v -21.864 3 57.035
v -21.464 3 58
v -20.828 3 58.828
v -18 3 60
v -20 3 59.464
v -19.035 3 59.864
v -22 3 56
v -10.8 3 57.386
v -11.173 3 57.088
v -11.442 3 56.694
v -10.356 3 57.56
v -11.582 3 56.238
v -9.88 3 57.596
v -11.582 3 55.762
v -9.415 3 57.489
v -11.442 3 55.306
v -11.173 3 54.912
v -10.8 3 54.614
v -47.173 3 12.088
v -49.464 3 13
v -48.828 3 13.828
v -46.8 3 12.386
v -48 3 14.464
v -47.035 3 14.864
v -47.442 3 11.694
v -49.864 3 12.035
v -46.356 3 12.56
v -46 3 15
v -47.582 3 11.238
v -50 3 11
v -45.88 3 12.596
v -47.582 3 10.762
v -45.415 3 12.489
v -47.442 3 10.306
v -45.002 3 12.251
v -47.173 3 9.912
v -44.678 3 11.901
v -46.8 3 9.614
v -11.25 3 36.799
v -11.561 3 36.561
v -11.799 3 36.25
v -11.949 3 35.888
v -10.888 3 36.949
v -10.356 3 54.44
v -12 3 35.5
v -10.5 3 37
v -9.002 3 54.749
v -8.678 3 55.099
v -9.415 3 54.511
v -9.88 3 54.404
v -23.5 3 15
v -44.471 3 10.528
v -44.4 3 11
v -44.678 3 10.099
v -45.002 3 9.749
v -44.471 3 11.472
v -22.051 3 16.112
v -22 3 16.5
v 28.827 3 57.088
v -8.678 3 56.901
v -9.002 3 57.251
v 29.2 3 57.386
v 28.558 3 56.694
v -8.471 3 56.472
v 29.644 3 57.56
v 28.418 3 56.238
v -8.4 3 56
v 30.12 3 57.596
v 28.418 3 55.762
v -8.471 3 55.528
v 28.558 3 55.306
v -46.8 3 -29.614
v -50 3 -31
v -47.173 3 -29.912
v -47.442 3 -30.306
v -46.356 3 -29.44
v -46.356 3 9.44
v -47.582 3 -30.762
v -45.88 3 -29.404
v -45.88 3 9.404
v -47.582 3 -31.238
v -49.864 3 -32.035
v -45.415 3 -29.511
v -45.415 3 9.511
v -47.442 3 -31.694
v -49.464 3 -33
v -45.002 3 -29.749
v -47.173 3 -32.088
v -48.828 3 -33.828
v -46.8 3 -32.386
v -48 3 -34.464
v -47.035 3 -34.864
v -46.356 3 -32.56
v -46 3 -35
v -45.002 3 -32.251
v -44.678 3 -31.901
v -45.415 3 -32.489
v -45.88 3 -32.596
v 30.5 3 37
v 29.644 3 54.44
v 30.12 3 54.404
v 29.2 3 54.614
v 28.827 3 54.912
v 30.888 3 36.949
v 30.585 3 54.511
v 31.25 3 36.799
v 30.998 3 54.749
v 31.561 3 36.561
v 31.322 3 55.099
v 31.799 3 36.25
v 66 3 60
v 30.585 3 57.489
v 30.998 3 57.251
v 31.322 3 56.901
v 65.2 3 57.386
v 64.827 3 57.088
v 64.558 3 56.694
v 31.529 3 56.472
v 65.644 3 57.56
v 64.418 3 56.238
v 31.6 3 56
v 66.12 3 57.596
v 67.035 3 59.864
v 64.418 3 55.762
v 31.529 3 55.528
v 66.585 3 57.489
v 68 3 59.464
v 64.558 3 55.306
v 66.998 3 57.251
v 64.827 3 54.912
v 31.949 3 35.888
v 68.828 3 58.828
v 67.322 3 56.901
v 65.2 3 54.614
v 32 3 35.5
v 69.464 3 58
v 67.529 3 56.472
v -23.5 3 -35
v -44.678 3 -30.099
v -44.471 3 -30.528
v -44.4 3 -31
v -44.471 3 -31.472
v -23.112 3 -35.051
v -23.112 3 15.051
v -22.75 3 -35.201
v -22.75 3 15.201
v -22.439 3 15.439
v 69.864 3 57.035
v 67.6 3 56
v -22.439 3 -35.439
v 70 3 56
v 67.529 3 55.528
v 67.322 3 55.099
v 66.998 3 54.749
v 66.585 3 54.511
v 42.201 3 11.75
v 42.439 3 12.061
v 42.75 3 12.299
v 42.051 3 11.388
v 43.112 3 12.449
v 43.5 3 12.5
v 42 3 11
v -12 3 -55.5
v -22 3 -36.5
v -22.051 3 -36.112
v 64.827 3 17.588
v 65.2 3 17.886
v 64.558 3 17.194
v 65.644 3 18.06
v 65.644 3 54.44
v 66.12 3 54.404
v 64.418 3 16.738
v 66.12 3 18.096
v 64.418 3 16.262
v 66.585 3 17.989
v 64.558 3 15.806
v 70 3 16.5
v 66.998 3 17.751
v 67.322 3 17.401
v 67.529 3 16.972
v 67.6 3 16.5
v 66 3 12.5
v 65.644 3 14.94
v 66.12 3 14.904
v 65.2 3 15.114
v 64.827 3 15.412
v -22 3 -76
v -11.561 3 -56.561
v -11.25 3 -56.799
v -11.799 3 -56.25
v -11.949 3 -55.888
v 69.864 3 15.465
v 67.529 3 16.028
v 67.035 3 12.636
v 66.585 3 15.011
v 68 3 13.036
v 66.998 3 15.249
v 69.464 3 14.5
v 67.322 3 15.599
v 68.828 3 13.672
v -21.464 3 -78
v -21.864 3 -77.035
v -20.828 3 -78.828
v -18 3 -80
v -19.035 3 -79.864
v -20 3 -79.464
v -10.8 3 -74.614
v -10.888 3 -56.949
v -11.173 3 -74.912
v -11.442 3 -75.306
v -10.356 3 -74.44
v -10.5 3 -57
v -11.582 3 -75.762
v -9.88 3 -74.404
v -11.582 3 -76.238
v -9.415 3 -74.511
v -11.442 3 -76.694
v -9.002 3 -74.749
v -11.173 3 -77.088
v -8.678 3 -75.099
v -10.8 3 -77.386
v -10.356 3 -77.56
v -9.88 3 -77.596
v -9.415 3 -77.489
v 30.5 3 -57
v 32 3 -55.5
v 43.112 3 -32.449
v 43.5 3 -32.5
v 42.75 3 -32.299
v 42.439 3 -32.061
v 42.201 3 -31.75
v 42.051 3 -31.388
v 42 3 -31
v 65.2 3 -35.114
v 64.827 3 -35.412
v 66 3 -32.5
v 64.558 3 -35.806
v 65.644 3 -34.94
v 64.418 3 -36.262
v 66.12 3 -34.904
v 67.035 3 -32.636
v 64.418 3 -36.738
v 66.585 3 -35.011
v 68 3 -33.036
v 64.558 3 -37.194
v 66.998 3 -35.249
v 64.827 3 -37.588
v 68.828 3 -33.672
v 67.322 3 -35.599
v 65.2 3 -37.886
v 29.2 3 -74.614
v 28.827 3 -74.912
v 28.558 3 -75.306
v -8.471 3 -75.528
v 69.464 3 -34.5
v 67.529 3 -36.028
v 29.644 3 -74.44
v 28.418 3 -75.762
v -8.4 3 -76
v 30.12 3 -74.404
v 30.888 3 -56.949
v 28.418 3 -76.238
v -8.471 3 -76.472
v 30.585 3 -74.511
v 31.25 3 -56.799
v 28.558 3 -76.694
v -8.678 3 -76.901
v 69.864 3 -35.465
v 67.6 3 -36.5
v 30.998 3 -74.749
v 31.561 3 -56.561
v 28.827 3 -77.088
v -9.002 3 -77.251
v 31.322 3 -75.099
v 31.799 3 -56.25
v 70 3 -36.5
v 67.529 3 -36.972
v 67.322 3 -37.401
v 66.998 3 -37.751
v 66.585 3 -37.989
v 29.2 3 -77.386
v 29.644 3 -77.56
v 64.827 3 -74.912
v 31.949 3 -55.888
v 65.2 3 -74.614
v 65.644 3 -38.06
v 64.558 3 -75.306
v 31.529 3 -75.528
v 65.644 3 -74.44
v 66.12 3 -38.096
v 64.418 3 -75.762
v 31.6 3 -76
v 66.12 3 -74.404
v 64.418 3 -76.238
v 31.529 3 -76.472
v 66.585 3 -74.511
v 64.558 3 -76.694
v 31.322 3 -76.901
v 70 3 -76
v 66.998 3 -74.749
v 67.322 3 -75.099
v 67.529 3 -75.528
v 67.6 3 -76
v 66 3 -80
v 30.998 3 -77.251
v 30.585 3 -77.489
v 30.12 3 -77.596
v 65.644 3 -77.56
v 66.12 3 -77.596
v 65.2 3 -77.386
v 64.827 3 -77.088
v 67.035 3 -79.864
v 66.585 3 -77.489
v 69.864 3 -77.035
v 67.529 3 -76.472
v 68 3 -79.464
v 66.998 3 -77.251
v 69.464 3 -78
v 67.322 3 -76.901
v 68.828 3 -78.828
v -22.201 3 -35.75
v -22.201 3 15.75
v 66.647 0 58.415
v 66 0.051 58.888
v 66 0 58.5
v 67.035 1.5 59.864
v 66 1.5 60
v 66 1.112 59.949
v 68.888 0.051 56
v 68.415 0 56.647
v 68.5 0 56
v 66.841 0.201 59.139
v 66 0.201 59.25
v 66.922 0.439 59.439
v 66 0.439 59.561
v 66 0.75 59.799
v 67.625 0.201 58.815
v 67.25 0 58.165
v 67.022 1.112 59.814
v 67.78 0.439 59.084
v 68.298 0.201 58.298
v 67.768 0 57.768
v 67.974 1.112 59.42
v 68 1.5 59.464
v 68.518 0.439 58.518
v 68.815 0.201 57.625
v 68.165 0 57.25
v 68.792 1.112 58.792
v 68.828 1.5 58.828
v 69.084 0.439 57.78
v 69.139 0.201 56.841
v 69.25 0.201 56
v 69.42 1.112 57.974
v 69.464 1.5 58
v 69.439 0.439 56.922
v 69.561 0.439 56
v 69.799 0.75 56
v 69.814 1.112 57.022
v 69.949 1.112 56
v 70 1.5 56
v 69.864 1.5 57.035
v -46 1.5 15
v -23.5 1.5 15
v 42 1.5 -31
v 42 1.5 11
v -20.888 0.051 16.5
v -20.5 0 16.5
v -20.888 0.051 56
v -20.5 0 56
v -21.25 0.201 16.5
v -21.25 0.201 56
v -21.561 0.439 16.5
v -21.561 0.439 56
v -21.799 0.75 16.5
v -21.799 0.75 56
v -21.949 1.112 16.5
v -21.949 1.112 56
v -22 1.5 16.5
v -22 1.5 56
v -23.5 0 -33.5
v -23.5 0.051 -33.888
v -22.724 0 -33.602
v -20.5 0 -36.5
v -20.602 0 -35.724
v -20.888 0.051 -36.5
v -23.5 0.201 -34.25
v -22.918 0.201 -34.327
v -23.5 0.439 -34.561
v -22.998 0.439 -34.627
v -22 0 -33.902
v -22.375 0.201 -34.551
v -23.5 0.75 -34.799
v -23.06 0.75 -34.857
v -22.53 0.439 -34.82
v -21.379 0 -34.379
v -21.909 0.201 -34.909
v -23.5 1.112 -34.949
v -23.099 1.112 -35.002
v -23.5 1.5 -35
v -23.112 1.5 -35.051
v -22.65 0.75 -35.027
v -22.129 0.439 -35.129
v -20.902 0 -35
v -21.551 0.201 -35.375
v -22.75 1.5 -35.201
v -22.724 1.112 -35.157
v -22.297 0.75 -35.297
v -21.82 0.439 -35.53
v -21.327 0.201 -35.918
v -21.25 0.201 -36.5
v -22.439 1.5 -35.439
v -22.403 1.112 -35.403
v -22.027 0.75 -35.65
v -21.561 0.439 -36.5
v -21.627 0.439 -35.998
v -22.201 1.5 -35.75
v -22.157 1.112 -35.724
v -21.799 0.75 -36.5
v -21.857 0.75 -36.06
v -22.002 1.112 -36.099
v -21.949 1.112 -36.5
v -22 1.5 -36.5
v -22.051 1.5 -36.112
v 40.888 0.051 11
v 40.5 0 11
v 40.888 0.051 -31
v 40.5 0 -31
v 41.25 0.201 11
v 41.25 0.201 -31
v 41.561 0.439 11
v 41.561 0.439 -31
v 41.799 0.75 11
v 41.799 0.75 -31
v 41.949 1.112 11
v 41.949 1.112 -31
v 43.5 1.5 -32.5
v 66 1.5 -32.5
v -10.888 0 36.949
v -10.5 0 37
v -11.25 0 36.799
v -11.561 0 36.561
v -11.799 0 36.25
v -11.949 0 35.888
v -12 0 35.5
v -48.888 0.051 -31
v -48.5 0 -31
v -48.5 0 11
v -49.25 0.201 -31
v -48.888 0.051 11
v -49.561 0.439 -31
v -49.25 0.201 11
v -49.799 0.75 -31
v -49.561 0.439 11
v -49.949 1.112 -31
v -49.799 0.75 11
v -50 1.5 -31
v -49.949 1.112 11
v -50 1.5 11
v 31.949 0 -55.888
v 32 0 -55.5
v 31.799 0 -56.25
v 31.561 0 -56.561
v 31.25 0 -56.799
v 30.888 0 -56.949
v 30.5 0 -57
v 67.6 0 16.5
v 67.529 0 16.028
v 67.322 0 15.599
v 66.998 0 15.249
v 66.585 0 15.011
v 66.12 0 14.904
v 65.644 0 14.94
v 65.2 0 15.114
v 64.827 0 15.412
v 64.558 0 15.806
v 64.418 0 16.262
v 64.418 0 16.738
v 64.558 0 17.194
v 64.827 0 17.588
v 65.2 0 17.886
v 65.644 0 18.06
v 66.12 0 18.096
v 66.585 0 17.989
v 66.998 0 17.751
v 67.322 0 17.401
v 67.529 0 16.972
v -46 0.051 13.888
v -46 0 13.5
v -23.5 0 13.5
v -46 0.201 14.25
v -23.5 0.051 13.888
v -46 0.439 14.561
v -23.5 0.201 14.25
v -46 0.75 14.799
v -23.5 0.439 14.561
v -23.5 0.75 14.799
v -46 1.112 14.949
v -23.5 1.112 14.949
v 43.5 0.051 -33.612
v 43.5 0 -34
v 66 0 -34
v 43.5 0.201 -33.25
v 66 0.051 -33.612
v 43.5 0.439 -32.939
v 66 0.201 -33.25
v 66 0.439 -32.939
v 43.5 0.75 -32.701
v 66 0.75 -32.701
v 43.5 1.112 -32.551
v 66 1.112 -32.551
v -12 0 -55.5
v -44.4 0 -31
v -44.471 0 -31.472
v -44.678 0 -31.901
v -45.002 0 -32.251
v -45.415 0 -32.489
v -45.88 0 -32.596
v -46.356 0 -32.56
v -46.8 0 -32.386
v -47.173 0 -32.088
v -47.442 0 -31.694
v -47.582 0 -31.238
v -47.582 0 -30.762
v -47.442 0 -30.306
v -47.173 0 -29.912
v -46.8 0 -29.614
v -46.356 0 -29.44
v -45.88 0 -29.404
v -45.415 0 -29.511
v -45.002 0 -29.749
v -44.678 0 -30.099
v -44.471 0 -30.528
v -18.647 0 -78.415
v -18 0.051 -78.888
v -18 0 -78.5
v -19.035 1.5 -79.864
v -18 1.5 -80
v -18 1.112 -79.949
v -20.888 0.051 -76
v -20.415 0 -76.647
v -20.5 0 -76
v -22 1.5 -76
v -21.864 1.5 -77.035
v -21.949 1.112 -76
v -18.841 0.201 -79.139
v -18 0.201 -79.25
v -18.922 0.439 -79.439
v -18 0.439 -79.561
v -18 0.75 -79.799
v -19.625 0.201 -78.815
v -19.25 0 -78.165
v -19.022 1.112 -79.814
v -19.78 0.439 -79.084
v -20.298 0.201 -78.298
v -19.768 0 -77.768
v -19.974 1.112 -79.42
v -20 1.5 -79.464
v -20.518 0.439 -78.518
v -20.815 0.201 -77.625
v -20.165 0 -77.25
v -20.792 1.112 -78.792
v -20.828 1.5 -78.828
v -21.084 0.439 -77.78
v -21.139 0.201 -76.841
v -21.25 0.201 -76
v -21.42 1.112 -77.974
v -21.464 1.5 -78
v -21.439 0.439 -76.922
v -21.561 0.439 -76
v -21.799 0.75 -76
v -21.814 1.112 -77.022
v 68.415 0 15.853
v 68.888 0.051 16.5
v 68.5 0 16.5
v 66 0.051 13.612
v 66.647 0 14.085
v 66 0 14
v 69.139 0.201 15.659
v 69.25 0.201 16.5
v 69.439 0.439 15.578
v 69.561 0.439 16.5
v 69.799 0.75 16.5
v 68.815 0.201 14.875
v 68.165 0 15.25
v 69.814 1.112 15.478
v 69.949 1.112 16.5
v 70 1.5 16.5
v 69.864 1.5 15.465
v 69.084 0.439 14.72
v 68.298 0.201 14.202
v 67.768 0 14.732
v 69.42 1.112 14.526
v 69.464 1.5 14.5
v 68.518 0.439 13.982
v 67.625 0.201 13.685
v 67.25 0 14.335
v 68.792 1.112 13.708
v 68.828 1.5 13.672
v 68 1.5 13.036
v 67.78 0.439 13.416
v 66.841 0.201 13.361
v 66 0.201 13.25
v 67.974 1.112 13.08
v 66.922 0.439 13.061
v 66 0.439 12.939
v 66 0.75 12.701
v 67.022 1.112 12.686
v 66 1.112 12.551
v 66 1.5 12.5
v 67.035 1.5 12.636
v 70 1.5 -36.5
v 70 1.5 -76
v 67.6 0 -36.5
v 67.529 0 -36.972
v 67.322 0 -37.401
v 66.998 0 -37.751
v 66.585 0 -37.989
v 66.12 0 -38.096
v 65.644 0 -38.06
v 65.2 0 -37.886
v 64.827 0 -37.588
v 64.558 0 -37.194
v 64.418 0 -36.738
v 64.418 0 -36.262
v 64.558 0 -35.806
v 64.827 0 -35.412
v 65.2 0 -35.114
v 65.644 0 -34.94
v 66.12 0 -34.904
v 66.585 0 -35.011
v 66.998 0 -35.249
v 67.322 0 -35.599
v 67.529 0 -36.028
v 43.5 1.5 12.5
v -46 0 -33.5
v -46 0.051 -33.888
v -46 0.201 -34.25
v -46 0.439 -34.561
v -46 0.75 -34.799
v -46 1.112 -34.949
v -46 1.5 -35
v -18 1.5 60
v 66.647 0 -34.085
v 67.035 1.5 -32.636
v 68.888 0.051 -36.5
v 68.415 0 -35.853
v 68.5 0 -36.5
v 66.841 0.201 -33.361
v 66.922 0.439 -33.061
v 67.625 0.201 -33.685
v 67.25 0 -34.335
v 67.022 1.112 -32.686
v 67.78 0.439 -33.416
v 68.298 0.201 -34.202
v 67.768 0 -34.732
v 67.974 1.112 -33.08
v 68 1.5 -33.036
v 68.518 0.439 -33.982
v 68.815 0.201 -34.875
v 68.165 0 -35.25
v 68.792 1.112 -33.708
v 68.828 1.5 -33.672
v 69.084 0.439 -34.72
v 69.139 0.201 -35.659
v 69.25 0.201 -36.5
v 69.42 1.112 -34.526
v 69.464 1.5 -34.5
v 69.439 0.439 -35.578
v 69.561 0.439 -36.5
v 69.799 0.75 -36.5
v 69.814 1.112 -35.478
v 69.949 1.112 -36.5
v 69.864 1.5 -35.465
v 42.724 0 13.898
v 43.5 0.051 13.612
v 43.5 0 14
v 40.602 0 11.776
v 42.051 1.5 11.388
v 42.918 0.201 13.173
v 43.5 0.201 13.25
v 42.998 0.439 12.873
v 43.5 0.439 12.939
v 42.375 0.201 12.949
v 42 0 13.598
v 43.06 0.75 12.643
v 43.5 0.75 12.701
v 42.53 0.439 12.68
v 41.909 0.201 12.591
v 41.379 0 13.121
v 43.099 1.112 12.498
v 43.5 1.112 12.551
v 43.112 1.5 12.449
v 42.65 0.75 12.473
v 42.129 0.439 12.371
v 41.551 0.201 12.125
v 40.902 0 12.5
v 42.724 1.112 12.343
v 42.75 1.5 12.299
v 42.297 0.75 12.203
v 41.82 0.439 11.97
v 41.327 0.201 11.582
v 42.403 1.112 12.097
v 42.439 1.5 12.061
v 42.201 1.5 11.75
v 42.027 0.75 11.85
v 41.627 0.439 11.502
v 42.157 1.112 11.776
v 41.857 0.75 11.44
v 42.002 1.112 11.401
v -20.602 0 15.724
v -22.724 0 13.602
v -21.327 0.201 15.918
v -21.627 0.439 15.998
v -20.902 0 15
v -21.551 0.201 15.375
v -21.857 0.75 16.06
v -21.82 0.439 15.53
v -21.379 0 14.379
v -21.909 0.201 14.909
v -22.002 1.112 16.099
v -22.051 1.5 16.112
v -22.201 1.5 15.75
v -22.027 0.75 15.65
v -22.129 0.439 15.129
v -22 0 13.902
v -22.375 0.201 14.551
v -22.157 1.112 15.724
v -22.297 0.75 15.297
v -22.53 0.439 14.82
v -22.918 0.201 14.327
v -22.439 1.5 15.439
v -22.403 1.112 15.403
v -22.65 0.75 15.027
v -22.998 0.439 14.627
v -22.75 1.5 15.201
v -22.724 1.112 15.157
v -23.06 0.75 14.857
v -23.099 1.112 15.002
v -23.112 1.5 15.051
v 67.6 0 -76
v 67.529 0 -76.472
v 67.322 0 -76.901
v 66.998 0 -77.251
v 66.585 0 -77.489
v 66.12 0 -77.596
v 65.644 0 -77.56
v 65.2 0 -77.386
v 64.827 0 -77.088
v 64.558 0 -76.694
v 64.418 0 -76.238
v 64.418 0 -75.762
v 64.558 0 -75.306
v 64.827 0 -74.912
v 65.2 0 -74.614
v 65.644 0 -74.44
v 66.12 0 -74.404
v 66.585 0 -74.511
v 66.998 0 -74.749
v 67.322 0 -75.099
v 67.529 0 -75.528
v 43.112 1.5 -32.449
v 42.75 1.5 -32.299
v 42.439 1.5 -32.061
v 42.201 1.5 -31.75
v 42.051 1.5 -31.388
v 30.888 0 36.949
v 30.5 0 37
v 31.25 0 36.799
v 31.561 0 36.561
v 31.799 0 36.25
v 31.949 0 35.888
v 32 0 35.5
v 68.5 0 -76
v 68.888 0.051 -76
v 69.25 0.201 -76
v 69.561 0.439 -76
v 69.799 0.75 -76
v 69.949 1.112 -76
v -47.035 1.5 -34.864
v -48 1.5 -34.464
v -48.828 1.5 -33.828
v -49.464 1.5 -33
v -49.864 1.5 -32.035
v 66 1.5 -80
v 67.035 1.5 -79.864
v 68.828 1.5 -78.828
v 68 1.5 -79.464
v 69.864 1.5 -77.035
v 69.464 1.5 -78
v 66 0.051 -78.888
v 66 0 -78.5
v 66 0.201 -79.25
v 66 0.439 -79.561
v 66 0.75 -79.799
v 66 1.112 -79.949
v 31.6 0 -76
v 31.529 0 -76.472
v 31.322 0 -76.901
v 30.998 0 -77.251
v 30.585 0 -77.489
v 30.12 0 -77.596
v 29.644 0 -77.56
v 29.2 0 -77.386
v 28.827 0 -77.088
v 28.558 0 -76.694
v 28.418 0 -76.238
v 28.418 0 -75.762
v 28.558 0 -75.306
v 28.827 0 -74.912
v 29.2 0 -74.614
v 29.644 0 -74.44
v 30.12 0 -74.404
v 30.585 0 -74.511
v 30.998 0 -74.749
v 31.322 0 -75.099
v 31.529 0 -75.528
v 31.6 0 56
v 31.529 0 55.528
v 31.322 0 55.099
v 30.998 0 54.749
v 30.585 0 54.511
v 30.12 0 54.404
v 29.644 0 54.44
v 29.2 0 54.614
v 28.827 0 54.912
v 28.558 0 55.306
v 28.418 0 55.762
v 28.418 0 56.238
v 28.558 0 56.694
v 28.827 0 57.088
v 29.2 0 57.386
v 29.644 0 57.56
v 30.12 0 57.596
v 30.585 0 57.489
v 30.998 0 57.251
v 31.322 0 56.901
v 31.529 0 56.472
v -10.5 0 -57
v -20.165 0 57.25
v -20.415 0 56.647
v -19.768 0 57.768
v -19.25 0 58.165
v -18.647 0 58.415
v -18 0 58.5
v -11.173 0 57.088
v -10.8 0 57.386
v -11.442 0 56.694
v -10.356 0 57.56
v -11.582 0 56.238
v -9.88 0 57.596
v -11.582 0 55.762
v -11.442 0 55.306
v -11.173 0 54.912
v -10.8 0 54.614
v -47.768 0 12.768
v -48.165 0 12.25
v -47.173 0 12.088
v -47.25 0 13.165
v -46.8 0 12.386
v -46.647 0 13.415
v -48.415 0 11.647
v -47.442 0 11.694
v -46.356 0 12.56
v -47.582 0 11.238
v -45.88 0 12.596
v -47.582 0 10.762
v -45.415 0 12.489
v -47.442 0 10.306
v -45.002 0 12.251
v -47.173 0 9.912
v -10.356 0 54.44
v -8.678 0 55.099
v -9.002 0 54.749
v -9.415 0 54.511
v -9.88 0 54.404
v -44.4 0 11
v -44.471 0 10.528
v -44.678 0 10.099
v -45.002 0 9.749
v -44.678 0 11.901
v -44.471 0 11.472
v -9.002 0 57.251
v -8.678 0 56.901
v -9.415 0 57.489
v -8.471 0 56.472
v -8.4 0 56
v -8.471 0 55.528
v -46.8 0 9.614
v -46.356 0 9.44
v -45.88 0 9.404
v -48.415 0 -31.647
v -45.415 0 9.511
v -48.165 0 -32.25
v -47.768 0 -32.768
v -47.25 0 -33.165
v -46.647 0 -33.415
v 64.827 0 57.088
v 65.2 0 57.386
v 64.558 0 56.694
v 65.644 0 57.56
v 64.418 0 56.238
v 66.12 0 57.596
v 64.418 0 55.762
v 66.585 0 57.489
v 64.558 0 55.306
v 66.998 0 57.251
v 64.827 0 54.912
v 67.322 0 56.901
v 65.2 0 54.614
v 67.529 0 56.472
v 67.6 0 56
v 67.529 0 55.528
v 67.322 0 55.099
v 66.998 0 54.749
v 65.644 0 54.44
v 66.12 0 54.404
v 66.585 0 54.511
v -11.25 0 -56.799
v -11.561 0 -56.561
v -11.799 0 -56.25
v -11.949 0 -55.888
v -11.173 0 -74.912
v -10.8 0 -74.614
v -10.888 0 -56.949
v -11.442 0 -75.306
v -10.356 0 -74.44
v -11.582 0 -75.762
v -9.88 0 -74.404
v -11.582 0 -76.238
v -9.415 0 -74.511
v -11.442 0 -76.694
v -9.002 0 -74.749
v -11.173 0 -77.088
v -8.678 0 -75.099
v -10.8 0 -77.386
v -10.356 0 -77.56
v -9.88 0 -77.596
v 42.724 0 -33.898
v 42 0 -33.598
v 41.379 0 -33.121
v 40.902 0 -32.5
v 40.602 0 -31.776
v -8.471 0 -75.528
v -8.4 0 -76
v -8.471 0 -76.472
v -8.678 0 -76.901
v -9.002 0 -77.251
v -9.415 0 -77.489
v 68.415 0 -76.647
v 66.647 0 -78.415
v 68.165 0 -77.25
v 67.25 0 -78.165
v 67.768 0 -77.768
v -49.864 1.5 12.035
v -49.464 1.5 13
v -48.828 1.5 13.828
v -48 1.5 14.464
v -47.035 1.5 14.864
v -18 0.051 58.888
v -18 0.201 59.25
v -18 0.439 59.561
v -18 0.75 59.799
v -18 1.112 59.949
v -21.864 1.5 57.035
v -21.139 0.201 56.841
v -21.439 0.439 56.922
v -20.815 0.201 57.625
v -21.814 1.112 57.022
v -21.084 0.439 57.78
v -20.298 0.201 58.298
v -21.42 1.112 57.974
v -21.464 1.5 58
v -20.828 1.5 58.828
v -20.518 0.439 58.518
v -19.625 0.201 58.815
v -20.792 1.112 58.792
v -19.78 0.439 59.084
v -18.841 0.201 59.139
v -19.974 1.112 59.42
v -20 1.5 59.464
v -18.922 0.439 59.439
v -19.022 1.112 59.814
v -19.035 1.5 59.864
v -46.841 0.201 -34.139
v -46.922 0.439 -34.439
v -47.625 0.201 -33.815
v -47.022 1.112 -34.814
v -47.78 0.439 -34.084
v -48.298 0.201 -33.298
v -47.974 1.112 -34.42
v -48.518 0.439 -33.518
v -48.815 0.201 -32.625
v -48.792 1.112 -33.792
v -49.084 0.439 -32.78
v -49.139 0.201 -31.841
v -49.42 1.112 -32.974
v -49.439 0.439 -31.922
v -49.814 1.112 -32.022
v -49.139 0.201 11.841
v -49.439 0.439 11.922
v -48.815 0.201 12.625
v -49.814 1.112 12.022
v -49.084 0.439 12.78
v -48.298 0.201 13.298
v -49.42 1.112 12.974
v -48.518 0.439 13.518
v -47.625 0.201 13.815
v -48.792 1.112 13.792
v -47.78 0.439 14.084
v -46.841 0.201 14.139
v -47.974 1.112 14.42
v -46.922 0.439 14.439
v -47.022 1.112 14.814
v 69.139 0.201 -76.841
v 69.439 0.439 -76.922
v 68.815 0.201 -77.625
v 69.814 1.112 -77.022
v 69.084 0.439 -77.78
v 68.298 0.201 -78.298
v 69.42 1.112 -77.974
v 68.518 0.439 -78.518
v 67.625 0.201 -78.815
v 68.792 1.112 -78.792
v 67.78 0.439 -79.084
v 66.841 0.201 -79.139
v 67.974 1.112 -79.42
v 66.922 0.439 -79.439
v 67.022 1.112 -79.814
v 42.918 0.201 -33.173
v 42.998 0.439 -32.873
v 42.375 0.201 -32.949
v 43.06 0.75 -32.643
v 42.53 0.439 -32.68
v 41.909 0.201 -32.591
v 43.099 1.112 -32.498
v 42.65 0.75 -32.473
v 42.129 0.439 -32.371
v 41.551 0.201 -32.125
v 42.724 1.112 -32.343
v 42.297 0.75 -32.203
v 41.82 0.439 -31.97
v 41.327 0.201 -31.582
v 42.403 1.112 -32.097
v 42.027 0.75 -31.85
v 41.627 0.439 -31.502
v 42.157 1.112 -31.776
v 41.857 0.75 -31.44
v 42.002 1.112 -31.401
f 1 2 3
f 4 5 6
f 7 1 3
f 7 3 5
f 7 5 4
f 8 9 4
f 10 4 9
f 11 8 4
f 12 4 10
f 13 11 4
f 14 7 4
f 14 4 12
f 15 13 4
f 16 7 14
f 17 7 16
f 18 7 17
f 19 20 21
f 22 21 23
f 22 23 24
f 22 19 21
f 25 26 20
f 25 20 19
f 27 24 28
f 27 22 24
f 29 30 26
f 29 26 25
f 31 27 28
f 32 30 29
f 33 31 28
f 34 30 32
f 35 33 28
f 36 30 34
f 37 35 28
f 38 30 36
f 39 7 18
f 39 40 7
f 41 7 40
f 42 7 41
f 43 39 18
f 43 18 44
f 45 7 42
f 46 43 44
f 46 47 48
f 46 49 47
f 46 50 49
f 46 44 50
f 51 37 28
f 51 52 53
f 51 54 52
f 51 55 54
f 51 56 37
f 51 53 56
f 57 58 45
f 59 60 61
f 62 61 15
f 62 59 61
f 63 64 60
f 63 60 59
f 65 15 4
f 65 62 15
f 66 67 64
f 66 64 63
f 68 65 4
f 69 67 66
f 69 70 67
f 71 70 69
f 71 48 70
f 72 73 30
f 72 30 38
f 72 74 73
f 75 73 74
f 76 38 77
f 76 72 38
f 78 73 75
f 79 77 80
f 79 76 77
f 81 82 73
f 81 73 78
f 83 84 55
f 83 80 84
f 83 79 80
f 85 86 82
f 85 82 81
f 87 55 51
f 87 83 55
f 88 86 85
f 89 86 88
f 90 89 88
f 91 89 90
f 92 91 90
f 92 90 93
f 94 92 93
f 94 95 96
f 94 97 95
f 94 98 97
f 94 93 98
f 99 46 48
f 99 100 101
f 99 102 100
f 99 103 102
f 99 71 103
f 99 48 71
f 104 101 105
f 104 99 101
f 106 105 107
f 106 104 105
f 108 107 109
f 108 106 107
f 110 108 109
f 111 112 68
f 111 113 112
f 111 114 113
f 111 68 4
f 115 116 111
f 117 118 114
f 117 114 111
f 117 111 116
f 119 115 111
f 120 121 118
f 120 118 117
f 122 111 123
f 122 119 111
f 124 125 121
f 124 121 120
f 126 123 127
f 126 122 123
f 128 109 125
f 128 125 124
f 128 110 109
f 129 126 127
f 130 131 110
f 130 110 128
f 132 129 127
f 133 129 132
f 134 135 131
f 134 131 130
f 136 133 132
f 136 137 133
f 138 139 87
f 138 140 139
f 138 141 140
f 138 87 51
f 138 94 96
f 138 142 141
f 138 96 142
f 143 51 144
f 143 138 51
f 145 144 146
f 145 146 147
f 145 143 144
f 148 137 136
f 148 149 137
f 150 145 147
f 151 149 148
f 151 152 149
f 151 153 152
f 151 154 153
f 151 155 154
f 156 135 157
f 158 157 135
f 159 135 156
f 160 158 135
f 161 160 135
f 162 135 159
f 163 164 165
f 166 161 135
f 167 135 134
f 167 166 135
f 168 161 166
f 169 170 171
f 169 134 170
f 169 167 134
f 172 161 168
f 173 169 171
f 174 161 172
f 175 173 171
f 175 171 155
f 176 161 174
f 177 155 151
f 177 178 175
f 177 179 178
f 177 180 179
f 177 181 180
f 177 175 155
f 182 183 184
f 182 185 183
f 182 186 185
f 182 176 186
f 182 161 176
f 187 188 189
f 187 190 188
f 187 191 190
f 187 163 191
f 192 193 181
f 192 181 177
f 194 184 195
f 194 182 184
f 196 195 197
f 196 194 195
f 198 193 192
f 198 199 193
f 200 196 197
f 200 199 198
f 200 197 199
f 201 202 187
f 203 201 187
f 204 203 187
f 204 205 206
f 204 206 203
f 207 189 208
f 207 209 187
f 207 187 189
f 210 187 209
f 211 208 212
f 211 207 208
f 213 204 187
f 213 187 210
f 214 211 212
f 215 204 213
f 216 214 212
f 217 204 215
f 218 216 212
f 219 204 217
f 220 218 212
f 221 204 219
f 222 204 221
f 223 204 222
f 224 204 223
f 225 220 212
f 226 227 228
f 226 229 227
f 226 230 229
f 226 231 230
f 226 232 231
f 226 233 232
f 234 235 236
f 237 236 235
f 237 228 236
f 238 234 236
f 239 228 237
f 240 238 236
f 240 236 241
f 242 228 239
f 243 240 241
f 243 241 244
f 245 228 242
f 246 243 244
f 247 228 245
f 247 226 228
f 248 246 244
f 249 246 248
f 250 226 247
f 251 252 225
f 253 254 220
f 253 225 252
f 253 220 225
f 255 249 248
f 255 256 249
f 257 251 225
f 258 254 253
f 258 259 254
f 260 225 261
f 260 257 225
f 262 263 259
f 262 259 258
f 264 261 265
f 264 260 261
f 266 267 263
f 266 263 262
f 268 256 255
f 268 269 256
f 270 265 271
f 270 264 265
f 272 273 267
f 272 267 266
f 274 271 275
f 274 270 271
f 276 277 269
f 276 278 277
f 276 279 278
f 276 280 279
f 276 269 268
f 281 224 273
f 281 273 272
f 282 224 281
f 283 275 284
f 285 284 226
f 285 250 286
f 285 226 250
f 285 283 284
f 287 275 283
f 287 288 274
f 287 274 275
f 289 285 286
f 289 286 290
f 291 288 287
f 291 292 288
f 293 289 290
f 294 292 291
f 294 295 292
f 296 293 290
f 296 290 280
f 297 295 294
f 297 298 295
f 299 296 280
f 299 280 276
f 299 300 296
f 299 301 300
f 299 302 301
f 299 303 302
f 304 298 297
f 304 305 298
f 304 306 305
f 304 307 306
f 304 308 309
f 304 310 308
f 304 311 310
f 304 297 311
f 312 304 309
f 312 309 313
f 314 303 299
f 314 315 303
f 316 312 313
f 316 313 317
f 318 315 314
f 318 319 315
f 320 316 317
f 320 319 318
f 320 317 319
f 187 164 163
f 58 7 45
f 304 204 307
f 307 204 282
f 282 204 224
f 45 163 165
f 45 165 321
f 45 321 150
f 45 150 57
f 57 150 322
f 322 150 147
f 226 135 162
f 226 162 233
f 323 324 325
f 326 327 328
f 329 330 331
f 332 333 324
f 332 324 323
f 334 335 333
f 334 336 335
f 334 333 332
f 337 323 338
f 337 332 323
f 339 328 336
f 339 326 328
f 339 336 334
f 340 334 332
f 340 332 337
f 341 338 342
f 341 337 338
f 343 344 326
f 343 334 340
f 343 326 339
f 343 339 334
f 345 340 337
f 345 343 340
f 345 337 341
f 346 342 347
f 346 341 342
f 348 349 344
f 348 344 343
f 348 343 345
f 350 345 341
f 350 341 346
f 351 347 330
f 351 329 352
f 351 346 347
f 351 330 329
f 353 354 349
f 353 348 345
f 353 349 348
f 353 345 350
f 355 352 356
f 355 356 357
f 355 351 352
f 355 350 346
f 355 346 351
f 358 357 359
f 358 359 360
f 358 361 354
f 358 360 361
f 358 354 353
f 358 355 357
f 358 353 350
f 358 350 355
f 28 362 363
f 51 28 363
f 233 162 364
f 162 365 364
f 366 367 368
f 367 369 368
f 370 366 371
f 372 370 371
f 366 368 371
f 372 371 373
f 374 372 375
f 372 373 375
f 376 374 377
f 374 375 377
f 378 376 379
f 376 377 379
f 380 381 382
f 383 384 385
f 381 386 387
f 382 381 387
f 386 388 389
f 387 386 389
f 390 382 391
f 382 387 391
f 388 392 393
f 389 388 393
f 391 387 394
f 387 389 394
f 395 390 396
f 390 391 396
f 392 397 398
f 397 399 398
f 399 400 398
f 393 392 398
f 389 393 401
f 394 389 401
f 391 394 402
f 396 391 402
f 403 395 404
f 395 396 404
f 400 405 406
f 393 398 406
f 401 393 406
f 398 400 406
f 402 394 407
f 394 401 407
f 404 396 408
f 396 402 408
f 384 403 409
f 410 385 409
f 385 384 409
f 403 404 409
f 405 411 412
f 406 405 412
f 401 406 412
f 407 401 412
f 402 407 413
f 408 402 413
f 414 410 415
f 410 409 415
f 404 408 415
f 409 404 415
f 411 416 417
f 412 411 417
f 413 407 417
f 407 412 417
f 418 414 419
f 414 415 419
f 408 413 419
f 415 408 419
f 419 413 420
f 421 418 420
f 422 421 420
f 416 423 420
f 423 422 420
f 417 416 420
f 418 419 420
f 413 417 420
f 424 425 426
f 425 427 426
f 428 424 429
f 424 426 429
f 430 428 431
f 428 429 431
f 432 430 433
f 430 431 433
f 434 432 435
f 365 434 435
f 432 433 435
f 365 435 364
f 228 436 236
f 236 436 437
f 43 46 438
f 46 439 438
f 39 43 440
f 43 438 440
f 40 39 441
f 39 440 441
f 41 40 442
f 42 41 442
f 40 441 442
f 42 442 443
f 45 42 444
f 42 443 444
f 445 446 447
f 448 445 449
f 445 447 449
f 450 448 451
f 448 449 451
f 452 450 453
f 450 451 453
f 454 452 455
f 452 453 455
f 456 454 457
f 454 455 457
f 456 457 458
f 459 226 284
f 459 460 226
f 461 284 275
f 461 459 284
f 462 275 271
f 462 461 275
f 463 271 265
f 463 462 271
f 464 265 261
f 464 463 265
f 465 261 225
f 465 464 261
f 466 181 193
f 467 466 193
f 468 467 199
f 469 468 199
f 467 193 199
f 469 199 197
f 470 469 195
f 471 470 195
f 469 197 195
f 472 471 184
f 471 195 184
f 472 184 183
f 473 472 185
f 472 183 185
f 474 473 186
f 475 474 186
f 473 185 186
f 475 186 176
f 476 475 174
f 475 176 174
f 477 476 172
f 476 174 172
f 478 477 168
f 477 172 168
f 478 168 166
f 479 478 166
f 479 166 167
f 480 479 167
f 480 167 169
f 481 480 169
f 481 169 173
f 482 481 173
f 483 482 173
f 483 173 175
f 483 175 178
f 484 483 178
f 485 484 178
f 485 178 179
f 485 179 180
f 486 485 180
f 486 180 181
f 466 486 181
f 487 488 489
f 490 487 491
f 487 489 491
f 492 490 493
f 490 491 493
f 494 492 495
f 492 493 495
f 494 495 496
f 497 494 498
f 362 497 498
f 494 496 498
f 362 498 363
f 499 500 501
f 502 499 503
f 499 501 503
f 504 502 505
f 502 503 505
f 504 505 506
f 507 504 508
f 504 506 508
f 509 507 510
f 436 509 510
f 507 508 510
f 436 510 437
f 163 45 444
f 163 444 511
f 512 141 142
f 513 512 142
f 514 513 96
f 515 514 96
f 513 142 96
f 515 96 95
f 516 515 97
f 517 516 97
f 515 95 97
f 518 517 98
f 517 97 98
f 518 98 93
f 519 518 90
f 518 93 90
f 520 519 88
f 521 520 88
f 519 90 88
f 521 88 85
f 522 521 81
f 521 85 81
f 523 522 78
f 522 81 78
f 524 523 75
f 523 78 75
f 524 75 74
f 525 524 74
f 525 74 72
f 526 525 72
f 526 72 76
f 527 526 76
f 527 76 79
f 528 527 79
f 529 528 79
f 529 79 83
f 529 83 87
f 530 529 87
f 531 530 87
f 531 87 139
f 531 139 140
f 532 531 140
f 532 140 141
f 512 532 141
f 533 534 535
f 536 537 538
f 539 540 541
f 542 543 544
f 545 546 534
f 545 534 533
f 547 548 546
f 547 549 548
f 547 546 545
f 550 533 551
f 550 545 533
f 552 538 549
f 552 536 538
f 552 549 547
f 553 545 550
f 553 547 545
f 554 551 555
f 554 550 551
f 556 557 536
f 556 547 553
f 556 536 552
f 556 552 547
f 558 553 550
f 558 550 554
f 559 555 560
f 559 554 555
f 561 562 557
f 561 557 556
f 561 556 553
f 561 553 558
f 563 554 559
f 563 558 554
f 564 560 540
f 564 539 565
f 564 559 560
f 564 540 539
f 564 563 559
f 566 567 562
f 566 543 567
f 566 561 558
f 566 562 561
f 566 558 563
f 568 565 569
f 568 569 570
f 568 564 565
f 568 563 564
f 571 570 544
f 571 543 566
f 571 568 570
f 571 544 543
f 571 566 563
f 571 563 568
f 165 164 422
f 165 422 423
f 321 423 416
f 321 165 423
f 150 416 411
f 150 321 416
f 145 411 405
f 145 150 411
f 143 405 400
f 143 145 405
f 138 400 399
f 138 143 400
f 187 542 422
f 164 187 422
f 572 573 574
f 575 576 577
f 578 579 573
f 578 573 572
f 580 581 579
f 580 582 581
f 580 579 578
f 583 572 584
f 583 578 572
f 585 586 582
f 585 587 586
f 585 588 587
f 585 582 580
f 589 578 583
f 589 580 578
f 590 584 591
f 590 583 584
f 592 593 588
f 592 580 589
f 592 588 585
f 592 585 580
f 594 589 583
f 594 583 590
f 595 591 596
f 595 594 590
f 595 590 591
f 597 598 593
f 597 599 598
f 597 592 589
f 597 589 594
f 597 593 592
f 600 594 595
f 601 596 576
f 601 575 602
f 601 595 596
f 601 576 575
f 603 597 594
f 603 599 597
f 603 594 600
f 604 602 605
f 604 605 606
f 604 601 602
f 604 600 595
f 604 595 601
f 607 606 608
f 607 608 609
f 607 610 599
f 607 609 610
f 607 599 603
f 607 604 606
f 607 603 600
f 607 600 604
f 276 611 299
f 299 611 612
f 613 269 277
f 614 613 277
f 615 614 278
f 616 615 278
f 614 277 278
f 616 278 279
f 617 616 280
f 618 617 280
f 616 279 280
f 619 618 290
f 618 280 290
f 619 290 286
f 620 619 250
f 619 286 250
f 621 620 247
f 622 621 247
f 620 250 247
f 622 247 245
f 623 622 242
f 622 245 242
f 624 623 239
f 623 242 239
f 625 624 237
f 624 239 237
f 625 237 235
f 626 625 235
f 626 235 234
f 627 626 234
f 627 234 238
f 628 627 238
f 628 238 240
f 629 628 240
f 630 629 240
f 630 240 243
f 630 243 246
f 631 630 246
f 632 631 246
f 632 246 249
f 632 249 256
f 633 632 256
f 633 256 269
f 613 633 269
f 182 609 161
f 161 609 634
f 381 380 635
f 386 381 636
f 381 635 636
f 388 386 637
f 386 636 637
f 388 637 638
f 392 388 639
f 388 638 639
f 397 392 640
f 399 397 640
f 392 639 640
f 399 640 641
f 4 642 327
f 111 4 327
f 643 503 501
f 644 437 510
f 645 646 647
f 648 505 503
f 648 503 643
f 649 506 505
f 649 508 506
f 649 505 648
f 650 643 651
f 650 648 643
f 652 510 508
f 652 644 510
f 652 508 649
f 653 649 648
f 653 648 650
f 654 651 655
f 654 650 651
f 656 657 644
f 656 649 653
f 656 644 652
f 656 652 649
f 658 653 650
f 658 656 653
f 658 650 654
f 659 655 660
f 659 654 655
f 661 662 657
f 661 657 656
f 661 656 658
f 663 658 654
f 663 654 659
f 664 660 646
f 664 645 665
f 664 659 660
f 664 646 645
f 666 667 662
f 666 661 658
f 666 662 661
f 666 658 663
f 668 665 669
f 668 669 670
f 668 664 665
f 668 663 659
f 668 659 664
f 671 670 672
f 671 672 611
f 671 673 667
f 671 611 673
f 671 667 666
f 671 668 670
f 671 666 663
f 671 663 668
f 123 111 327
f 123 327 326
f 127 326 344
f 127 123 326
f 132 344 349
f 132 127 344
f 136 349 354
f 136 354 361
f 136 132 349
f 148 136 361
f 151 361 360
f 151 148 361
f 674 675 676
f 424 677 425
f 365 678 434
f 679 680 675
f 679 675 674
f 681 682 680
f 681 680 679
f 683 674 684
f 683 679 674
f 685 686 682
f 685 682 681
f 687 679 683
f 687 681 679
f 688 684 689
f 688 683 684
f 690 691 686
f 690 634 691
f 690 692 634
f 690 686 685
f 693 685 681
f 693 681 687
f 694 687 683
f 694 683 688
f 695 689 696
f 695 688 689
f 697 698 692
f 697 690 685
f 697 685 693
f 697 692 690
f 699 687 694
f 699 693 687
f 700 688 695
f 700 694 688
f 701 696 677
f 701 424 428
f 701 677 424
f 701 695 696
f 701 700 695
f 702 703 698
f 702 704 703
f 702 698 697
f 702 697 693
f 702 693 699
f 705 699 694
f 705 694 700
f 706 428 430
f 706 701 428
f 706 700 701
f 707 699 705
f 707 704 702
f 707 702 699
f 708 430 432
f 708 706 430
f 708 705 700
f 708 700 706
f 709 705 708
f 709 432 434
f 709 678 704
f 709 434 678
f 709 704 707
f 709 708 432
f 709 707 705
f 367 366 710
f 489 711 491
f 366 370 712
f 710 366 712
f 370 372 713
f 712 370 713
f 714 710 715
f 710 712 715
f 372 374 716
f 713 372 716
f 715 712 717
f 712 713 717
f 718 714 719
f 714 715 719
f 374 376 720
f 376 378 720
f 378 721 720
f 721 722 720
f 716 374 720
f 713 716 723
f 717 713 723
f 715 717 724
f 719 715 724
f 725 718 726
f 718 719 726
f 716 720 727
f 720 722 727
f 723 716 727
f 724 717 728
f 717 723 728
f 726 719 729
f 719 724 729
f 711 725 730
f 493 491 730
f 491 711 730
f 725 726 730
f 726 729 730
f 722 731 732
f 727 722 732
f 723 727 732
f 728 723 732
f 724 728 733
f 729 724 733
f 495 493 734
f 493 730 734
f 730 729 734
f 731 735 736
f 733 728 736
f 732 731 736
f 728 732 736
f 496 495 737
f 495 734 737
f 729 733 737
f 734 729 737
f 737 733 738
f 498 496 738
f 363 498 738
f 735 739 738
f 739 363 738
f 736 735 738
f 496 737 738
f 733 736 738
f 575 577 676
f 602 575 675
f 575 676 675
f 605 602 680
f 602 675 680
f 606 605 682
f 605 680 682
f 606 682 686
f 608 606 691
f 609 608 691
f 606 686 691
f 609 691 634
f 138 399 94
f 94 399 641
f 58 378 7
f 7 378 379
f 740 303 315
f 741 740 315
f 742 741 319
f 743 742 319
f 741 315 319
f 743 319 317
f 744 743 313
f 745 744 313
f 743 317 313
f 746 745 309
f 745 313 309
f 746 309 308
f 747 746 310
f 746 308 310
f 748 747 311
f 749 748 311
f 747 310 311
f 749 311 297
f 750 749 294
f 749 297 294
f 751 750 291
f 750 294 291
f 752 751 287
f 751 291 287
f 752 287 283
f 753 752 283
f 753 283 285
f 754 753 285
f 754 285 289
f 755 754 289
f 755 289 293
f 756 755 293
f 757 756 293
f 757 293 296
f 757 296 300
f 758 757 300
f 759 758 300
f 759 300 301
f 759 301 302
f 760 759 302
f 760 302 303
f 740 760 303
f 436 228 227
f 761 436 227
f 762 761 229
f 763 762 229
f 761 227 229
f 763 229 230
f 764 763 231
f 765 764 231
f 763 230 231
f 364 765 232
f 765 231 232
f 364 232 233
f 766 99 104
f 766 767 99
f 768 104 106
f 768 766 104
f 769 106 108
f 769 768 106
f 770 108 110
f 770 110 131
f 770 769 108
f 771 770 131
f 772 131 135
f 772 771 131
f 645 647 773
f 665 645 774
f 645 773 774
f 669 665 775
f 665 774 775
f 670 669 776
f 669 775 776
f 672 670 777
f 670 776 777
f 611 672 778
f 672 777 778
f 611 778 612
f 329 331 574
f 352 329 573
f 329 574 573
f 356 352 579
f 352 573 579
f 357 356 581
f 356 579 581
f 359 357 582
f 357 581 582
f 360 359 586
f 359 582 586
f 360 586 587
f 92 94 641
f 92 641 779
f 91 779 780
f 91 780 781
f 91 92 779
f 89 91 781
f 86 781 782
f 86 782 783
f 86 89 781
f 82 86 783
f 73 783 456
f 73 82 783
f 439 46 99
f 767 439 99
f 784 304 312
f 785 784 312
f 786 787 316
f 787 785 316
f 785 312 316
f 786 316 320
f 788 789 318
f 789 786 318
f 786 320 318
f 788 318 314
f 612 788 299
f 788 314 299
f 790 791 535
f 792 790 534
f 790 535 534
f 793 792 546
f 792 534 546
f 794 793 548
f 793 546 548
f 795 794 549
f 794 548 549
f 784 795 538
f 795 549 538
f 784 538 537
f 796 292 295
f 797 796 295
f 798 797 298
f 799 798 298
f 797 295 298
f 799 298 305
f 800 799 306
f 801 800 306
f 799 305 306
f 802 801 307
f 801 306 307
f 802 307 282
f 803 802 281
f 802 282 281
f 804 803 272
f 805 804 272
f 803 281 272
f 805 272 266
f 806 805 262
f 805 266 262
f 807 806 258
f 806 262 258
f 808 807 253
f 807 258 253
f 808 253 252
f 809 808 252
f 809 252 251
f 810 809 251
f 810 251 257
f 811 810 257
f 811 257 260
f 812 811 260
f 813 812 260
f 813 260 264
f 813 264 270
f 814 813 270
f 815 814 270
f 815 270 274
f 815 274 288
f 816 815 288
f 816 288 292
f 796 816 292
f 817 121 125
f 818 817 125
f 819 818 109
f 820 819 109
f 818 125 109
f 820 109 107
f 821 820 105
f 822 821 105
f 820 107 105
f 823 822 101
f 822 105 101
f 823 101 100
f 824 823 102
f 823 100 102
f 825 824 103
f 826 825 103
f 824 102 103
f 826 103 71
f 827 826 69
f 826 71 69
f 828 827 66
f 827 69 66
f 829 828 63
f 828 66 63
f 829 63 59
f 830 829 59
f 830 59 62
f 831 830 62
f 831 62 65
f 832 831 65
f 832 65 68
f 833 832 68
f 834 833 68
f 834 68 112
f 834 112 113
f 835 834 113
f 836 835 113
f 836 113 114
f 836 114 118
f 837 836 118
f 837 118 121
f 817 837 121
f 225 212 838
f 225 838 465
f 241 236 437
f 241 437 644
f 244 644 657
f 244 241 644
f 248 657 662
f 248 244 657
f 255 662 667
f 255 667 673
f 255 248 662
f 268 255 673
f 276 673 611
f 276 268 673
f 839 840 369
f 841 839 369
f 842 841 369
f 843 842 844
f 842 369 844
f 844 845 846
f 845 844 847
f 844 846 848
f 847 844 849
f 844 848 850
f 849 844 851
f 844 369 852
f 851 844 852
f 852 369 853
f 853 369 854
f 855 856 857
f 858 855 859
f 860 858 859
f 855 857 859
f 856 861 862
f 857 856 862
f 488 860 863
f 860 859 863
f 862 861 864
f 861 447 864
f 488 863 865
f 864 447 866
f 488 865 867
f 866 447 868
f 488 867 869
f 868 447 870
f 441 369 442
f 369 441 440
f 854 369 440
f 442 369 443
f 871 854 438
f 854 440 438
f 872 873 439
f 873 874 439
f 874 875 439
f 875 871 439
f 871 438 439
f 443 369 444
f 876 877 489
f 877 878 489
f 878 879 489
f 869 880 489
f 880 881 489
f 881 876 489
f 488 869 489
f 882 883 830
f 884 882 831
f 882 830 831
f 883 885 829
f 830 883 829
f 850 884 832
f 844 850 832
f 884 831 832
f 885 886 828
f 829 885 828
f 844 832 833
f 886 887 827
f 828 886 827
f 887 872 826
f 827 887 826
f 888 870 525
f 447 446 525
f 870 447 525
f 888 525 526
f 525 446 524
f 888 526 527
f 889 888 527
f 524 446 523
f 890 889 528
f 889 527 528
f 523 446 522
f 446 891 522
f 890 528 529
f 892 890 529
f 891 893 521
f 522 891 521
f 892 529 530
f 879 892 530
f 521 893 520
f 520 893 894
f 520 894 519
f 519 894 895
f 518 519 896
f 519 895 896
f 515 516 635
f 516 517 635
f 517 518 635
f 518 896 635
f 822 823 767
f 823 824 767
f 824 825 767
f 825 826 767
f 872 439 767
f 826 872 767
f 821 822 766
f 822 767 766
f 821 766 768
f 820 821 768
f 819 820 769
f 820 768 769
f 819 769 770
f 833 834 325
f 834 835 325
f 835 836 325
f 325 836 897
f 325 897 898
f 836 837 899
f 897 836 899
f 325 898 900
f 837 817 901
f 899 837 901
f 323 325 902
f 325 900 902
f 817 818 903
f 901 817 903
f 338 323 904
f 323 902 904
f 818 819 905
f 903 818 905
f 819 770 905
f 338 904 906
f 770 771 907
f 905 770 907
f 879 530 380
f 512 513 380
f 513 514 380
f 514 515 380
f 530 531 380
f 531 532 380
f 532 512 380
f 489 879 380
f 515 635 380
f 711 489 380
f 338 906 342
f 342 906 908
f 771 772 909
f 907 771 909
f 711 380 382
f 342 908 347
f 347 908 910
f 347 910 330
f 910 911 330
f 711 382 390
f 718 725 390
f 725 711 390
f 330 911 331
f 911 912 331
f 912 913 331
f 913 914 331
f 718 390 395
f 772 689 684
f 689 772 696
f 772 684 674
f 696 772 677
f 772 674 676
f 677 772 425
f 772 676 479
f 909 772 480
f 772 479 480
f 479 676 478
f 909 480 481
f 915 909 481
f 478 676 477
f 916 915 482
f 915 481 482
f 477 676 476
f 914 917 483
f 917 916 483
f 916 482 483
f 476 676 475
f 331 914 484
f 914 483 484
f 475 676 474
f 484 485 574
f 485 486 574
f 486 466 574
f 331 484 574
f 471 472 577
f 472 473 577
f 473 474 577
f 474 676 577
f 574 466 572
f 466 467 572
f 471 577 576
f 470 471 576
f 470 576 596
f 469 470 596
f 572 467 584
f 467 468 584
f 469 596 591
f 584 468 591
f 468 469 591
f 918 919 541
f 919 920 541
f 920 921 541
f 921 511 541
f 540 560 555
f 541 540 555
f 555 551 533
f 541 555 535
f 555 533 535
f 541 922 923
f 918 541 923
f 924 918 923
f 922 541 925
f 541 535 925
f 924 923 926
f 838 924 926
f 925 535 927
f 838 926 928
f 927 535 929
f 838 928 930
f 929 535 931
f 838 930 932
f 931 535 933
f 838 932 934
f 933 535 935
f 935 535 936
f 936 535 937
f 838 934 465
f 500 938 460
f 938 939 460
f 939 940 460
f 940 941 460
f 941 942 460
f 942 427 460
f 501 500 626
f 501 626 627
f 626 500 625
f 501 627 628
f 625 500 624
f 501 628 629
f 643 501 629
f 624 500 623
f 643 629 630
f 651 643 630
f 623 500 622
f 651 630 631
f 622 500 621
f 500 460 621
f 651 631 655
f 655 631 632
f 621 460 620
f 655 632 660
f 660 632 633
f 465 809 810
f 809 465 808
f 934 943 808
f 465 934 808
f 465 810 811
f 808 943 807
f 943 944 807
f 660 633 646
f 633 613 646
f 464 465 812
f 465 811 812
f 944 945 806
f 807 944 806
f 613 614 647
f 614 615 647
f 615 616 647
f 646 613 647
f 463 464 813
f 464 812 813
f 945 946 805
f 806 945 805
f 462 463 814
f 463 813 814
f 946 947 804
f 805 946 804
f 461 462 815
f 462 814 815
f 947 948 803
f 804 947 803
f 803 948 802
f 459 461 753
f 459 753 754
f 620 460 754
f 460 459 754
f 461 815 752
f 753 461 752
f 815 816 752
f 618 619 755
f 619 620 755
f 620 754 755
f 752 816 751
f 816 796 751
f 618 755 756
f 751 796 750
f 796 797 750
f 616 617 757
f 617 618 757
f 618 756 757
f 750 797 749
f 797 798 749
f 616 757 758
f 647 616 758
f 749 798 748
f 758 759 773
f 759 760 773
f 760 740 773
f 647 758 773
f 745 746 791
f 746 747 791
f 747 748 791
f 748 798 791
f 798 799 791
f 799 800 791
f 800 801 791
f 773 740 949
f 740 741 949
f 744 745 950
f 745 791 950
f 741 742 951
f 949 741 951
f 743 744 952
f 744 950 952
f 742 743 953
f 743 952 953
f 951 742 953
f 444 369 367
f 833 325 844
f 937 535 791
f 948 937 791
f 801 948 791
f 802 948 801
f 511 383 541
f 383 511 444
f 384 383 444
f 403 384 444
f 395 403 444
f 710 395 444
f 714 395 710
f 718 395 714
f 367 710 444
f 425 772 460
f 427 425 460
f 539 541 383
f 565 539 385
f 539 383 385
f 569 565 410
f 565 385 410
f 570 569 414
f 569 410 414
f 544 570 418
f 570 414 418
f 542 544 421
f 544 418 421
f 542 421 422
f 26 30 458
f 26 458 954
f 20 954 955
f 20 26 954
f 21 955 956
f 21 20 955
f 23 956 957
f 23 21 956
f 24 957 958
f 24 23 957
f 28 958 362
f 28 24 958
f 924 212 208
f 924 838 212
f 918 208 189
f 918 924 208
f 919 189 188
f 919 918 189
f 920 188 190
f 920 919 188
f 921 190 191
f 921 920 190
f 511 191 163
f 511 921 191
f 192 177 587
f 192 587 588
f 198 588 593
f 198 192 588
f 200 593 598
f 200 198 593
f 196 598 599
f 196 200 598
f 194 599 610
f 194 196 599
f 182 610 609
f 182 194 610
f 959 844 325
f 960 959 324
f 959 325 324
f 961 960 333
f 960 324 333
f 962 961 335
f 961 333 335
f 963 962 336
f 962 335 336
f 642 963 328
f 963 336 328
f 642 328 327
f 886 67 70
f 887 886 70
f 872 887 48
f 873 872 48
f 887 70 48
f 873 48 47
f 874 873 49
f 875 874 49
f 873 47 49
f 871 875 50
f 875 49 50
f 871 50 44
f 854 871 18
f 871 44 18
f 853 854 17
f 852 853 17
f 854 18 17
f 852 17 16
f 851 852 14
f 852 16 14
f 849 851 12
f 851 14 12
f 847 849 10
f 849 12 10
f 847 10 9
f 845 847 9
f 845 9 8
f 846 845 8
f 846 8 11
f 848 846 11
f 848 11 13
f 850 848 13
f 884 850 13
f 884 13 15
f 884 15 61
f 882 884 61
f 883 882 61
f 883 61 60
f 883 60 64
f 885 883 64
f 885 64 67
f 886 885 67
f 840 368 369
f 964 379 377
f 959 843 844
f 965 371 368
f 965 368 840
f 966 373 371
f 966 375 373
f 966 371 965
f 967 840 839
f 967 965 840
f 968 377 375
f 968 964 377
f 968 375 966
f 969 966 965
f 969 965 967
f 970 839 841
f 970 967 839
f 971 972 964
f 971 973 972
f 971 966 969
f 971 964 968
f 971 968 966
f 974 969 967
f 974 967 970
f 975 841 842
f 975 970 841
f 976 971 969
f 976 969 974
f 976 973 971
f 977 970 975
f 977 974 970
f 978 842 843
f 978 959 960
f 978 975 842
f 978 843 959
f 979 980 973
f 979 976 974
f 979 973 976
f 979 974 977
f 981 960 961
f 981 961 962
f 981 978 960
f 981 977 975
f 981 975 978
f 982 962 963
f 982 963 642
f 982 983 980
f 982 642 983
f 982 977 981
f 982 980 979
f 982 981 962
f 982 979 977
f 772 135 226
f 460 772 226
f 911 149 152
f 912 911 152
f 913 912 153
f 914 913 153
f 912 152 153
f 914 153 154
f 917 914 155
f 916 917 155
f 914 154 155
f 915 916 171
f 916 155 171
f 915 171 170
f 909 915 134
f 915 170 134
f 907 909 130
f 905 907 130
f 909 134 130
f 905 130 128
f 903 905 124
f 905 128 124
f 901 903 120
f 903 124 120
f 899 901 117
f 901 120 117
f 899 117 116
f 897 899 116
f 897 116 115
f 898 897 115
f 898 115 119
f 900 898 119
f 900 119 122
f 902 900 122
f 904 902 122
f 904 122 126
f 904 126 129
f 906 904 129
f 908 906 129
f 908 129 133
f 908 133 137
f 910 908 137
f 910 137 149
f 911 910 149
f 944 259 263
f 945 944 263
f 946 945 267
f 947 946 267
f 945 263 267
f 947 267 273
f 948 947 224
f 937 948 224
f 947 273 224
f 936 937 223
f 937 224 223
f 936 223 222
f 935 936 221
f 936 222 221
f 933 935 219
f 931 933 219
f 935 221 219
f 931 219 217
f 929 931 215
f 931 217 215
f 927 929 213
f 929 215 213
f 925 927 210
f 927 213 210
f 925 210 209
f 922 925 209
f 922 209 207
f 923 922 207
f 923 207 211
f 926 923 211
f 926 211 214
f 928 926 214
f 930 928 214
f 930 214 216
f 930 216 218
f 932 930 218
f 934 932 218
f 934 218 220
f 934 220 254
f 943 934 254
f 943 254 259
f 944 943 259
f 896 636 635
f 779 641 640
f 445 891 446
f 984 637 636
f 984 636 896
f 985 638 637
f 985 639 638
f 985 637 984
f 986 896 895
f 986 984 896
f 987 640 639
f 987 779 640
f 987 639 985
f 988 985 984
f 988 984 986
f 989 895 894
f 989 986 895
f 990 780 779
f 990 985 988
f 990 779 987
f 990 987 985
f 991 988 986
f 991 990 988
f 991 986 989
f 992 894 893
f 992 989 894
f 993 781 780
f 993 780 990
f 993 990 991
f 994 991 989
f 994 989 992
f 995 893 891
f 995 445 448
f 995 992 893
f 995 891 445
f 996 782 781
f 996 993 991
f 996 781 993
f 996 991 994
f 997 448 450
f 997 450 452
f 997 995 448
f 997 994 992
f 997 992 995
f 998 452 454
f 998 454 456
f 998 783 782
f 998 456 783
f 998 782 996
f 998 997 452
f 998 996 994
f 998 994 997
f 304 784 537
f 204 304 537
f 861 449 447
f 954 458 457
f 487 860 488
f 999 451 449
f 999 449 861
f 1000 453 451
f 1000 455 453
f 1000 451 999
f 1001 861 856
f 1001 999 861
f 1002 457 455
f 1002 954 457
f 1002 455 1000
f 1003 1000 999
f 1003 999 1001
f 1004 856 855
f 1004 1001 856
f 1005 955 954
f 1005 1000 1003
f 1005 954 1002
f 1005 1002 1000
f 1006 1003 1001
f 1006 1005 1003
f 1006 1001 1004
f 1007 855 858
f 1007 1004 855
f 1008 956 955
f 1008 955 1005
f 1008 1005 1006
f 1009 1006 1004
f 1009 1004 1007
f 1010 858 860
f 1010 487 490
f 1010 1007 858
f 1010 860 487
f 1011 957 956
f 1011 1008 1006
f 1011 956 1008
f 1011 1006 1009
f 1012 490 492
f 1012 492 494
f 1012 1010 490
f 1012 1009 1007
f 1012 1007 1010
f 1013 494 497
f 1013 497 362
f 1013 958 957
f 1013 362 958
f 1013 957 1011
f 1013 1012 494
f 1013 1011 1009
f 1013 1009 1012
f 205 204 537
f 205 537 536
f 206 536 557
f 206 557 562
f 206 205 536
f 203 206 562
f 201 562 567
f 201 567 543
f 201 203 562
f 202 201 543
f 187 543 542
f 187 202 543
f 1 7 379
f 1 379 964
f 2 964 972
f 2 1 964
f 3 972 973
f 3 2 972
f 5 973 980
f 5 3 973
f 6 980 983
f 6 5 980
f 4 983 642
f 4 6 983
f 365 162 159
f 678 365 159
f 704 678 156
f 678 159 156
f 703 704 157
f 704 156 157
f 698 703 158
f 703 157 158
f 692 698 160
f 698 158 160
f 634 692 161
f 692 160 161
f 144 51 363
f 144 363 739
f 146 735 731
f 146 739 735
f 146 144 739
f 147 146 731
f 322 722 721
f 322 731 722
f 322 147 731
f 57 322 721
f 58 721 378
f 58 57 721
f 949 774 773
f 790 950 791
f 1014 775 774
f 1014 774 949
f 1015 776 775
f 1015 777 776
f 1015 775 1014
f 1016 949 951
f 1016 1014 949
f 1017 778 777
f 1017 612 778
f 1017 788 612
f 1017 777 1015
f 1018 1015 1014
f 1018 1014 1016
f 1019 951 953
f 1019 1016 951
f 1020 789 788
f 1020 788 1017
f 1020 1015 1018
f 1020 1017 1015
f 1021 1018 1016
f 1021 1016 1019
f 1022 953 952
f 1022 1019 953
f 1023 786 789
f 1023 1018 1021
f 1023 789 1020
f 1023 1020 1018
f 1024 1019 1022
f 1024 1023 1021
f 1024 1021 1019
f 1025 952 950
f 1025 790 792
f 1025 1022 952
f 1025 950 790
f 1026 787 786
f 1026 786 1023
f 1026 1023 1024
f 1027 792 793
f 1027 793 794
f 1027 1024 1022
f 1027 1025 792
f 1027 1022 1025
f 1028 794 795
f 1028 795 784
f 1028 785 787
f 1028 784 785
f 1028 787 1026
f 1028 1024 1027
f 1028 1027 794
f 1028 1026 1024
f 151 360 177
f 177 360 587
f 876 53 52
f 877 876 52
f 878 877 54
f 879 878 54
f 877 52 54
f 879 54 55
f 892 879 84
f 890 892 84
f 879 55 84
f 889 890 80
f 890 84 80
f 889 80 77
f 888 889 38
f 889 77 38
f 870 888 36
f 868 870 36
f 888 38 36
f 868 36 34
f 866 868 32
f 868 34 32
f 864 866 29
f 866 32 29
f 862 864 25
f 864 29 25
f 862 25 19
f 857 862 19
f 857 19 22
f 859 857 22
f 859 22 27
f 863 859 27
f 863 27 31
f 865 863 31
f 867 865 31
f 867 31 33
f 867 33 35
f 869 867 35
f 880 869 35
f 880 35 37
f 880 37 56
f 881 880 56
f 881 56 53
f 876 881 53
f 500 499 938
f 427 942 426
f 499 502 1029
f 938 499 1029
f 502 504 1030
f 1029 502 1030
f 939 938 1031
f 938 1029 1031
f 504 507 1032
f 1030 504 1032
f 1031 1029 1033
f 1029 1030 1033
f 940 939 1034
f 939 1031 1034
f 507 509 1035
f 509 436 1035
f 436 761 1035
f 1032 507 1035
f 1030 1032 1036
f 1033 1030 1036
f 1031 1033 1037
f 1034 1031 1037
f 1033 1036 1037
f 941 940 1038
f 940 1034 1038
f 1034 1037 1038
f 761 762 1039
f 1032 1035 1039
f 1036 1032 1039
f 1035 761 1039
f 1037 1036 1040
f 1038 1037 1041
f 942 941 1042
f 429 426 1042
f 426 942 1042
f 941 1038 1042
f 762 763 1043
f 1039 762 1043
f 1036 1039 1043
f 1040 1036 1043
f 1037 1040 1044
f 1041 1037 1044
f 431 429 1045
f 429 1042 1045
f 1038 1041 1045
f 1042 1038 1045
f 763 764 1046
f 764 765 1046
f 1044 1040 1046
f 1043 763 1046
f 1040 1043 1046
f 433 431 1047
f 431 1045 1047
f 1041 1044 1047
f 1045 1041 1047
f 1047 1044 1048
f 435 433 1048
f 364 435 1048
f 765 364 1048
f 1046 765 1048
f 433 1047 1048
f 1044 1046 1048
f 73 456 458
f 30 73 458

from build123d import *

# Parameters (mm, degrees)
BOSS_EXTRUDE1_DEPTH     = 3
FILLET2_R               = 4
SKETCH7_R               = 1.6
CUT_EXTRUDE2_DEPTH      = 1
CUT_EXTRUDE2_DEPTH_BACK = 4
SKETCH4_W               = 44
SKETCH4_H               = 94
CUT_EXTRUDE3_DEPTH      = 10
FILLET3_R               = 1.5


with BuildPart() as part:
    # Sketch3 → Boss-Extrude1 (new body)
    with BuildSketch(Plane(origin=(0, 0, 0), x_dir=(1, 0, 0), z_dir=(0, 1, 0))):
        Polygon((70, 80), (-22, 80), (-22, 35), (-50, 35), (-50, -15), (-22, -15), (-22, -60), (70, -60), (70, -12.5), (42, -12.5), (42, 32.5), (70, 32.5), align=None)
    extrude(amount=BOSS_EXTRUDE1_DEPTH)

    # Fillet2
    fillet2_edges = [part.edges().sort_by_distance(p)[0] for p in [
        (70, 1.5, 12.5),
        (70, 1.5, 60),
        (-22, 1.5, 60),
        (-50, 1.5, 15),
        (-50, 1.5, -35),
        (-22, 1.5, -80),
        (70, 1.5, -80),
        (70, 1.5, -32.5),
    ]]
    fillet(fillet2_edges, radius=FILLET2_R)

    # Sketch7 → Cut-Extrude2 (cut, two sides)
    with BuildSketch(Plane(origin=(0, 3, 0), x_dir=(1, 0, 0), z_dir=(0, 1, 0))) as cut_extrude2_sk:
        with Locations((-46, 31)):
            Circle(SKETCH7_R)
        with Locations((-46, -11)):
            Circle(SKETCH7_R)
        with Locations((66, -56)):
            Circle(SKETCH7_R)
        with Locations((66, 76)):
            Circle(SKETCH7_R)
        with Locations((-10, 76)):
            Circle(SKETCH7_R)
        with Locations((-10, -56)):
            Circle(SKETCH7_R)
        with Locations((30, -56)):
            Circle(SKETCH7_R)
        with Locations((30, 76)):
            Circle(SKETCH7_R)
        with Locations((66, -16.5)):
            Circle(SKETCH7_R)
        with Locations((66, 36.5)):
            Circle(SKETCH7_R)
    extrude(amount=CUT_EXTRUDE2_DEPTH, mode=Mode.SUBTRACT)
    extrude(cut_extrude2_sk.sketch, amount=-CUT_EXTRUDE2_DEPTH_BACK, mode=Mode.SUBTRACT)

    # Sketch4 → Cut-Extrude3 (cut)
    with BuildSketch(Plane(origin=(0, 3, 0), x_dir=(1, 0, 0), z_dir=(0, 1, 0))):
        with Locations((10, 10)):
            Rectangle(SKETCH4_W, SKETCH4_H)
    extrude(amount=-CUT_EXTRUDE3_DEPTH, mode=Mode.SUBTRACT)

    # Fillet3
    fillet3_edges = [part.edges().sort_by_distance(p)[0] for p in [
        (32, 1.5, -57),
        (32, 1.5, 37),
        (-12, 1.5, 37),
        (-12, 1.5, -57),
        (-22, 0, 35.5),
        (-34, 0, -35),
        (54, 0, -32.5),
        (42, 0, -10),
        (42, 1.5, 12.5),
        (-22, 1.5, 15),
        (-22, 1.5, -35),
        (42, 1.5, -32.5),
        (-22, 0, -55.5),
        (54, 0, 12.5),
        (70, 0, 36.25),
        (24, 0, 60),
        (-34, 0, 15),
        (-50, 0, -10),
        (24, 0, -80),
        (70, 0, -56.25),
        (68.828427125, 0, 58.828427125),
        (68.828427125, 0, 13.671572875),
        (-20.828427125, 0, 58.828427125),
        (-48.828427125, 0, 13.828427125),
        (-48.828427125, 0, -33.828427125),
        (68.828427125, 0, -78.828427125),
        (68.828427125, 0, -33.671572875),
        (-20.828427125, 0, -78.828427125),
    ]]
    fillet(fillet3_edges, radius=FILLET3_R)


solid = part.part
